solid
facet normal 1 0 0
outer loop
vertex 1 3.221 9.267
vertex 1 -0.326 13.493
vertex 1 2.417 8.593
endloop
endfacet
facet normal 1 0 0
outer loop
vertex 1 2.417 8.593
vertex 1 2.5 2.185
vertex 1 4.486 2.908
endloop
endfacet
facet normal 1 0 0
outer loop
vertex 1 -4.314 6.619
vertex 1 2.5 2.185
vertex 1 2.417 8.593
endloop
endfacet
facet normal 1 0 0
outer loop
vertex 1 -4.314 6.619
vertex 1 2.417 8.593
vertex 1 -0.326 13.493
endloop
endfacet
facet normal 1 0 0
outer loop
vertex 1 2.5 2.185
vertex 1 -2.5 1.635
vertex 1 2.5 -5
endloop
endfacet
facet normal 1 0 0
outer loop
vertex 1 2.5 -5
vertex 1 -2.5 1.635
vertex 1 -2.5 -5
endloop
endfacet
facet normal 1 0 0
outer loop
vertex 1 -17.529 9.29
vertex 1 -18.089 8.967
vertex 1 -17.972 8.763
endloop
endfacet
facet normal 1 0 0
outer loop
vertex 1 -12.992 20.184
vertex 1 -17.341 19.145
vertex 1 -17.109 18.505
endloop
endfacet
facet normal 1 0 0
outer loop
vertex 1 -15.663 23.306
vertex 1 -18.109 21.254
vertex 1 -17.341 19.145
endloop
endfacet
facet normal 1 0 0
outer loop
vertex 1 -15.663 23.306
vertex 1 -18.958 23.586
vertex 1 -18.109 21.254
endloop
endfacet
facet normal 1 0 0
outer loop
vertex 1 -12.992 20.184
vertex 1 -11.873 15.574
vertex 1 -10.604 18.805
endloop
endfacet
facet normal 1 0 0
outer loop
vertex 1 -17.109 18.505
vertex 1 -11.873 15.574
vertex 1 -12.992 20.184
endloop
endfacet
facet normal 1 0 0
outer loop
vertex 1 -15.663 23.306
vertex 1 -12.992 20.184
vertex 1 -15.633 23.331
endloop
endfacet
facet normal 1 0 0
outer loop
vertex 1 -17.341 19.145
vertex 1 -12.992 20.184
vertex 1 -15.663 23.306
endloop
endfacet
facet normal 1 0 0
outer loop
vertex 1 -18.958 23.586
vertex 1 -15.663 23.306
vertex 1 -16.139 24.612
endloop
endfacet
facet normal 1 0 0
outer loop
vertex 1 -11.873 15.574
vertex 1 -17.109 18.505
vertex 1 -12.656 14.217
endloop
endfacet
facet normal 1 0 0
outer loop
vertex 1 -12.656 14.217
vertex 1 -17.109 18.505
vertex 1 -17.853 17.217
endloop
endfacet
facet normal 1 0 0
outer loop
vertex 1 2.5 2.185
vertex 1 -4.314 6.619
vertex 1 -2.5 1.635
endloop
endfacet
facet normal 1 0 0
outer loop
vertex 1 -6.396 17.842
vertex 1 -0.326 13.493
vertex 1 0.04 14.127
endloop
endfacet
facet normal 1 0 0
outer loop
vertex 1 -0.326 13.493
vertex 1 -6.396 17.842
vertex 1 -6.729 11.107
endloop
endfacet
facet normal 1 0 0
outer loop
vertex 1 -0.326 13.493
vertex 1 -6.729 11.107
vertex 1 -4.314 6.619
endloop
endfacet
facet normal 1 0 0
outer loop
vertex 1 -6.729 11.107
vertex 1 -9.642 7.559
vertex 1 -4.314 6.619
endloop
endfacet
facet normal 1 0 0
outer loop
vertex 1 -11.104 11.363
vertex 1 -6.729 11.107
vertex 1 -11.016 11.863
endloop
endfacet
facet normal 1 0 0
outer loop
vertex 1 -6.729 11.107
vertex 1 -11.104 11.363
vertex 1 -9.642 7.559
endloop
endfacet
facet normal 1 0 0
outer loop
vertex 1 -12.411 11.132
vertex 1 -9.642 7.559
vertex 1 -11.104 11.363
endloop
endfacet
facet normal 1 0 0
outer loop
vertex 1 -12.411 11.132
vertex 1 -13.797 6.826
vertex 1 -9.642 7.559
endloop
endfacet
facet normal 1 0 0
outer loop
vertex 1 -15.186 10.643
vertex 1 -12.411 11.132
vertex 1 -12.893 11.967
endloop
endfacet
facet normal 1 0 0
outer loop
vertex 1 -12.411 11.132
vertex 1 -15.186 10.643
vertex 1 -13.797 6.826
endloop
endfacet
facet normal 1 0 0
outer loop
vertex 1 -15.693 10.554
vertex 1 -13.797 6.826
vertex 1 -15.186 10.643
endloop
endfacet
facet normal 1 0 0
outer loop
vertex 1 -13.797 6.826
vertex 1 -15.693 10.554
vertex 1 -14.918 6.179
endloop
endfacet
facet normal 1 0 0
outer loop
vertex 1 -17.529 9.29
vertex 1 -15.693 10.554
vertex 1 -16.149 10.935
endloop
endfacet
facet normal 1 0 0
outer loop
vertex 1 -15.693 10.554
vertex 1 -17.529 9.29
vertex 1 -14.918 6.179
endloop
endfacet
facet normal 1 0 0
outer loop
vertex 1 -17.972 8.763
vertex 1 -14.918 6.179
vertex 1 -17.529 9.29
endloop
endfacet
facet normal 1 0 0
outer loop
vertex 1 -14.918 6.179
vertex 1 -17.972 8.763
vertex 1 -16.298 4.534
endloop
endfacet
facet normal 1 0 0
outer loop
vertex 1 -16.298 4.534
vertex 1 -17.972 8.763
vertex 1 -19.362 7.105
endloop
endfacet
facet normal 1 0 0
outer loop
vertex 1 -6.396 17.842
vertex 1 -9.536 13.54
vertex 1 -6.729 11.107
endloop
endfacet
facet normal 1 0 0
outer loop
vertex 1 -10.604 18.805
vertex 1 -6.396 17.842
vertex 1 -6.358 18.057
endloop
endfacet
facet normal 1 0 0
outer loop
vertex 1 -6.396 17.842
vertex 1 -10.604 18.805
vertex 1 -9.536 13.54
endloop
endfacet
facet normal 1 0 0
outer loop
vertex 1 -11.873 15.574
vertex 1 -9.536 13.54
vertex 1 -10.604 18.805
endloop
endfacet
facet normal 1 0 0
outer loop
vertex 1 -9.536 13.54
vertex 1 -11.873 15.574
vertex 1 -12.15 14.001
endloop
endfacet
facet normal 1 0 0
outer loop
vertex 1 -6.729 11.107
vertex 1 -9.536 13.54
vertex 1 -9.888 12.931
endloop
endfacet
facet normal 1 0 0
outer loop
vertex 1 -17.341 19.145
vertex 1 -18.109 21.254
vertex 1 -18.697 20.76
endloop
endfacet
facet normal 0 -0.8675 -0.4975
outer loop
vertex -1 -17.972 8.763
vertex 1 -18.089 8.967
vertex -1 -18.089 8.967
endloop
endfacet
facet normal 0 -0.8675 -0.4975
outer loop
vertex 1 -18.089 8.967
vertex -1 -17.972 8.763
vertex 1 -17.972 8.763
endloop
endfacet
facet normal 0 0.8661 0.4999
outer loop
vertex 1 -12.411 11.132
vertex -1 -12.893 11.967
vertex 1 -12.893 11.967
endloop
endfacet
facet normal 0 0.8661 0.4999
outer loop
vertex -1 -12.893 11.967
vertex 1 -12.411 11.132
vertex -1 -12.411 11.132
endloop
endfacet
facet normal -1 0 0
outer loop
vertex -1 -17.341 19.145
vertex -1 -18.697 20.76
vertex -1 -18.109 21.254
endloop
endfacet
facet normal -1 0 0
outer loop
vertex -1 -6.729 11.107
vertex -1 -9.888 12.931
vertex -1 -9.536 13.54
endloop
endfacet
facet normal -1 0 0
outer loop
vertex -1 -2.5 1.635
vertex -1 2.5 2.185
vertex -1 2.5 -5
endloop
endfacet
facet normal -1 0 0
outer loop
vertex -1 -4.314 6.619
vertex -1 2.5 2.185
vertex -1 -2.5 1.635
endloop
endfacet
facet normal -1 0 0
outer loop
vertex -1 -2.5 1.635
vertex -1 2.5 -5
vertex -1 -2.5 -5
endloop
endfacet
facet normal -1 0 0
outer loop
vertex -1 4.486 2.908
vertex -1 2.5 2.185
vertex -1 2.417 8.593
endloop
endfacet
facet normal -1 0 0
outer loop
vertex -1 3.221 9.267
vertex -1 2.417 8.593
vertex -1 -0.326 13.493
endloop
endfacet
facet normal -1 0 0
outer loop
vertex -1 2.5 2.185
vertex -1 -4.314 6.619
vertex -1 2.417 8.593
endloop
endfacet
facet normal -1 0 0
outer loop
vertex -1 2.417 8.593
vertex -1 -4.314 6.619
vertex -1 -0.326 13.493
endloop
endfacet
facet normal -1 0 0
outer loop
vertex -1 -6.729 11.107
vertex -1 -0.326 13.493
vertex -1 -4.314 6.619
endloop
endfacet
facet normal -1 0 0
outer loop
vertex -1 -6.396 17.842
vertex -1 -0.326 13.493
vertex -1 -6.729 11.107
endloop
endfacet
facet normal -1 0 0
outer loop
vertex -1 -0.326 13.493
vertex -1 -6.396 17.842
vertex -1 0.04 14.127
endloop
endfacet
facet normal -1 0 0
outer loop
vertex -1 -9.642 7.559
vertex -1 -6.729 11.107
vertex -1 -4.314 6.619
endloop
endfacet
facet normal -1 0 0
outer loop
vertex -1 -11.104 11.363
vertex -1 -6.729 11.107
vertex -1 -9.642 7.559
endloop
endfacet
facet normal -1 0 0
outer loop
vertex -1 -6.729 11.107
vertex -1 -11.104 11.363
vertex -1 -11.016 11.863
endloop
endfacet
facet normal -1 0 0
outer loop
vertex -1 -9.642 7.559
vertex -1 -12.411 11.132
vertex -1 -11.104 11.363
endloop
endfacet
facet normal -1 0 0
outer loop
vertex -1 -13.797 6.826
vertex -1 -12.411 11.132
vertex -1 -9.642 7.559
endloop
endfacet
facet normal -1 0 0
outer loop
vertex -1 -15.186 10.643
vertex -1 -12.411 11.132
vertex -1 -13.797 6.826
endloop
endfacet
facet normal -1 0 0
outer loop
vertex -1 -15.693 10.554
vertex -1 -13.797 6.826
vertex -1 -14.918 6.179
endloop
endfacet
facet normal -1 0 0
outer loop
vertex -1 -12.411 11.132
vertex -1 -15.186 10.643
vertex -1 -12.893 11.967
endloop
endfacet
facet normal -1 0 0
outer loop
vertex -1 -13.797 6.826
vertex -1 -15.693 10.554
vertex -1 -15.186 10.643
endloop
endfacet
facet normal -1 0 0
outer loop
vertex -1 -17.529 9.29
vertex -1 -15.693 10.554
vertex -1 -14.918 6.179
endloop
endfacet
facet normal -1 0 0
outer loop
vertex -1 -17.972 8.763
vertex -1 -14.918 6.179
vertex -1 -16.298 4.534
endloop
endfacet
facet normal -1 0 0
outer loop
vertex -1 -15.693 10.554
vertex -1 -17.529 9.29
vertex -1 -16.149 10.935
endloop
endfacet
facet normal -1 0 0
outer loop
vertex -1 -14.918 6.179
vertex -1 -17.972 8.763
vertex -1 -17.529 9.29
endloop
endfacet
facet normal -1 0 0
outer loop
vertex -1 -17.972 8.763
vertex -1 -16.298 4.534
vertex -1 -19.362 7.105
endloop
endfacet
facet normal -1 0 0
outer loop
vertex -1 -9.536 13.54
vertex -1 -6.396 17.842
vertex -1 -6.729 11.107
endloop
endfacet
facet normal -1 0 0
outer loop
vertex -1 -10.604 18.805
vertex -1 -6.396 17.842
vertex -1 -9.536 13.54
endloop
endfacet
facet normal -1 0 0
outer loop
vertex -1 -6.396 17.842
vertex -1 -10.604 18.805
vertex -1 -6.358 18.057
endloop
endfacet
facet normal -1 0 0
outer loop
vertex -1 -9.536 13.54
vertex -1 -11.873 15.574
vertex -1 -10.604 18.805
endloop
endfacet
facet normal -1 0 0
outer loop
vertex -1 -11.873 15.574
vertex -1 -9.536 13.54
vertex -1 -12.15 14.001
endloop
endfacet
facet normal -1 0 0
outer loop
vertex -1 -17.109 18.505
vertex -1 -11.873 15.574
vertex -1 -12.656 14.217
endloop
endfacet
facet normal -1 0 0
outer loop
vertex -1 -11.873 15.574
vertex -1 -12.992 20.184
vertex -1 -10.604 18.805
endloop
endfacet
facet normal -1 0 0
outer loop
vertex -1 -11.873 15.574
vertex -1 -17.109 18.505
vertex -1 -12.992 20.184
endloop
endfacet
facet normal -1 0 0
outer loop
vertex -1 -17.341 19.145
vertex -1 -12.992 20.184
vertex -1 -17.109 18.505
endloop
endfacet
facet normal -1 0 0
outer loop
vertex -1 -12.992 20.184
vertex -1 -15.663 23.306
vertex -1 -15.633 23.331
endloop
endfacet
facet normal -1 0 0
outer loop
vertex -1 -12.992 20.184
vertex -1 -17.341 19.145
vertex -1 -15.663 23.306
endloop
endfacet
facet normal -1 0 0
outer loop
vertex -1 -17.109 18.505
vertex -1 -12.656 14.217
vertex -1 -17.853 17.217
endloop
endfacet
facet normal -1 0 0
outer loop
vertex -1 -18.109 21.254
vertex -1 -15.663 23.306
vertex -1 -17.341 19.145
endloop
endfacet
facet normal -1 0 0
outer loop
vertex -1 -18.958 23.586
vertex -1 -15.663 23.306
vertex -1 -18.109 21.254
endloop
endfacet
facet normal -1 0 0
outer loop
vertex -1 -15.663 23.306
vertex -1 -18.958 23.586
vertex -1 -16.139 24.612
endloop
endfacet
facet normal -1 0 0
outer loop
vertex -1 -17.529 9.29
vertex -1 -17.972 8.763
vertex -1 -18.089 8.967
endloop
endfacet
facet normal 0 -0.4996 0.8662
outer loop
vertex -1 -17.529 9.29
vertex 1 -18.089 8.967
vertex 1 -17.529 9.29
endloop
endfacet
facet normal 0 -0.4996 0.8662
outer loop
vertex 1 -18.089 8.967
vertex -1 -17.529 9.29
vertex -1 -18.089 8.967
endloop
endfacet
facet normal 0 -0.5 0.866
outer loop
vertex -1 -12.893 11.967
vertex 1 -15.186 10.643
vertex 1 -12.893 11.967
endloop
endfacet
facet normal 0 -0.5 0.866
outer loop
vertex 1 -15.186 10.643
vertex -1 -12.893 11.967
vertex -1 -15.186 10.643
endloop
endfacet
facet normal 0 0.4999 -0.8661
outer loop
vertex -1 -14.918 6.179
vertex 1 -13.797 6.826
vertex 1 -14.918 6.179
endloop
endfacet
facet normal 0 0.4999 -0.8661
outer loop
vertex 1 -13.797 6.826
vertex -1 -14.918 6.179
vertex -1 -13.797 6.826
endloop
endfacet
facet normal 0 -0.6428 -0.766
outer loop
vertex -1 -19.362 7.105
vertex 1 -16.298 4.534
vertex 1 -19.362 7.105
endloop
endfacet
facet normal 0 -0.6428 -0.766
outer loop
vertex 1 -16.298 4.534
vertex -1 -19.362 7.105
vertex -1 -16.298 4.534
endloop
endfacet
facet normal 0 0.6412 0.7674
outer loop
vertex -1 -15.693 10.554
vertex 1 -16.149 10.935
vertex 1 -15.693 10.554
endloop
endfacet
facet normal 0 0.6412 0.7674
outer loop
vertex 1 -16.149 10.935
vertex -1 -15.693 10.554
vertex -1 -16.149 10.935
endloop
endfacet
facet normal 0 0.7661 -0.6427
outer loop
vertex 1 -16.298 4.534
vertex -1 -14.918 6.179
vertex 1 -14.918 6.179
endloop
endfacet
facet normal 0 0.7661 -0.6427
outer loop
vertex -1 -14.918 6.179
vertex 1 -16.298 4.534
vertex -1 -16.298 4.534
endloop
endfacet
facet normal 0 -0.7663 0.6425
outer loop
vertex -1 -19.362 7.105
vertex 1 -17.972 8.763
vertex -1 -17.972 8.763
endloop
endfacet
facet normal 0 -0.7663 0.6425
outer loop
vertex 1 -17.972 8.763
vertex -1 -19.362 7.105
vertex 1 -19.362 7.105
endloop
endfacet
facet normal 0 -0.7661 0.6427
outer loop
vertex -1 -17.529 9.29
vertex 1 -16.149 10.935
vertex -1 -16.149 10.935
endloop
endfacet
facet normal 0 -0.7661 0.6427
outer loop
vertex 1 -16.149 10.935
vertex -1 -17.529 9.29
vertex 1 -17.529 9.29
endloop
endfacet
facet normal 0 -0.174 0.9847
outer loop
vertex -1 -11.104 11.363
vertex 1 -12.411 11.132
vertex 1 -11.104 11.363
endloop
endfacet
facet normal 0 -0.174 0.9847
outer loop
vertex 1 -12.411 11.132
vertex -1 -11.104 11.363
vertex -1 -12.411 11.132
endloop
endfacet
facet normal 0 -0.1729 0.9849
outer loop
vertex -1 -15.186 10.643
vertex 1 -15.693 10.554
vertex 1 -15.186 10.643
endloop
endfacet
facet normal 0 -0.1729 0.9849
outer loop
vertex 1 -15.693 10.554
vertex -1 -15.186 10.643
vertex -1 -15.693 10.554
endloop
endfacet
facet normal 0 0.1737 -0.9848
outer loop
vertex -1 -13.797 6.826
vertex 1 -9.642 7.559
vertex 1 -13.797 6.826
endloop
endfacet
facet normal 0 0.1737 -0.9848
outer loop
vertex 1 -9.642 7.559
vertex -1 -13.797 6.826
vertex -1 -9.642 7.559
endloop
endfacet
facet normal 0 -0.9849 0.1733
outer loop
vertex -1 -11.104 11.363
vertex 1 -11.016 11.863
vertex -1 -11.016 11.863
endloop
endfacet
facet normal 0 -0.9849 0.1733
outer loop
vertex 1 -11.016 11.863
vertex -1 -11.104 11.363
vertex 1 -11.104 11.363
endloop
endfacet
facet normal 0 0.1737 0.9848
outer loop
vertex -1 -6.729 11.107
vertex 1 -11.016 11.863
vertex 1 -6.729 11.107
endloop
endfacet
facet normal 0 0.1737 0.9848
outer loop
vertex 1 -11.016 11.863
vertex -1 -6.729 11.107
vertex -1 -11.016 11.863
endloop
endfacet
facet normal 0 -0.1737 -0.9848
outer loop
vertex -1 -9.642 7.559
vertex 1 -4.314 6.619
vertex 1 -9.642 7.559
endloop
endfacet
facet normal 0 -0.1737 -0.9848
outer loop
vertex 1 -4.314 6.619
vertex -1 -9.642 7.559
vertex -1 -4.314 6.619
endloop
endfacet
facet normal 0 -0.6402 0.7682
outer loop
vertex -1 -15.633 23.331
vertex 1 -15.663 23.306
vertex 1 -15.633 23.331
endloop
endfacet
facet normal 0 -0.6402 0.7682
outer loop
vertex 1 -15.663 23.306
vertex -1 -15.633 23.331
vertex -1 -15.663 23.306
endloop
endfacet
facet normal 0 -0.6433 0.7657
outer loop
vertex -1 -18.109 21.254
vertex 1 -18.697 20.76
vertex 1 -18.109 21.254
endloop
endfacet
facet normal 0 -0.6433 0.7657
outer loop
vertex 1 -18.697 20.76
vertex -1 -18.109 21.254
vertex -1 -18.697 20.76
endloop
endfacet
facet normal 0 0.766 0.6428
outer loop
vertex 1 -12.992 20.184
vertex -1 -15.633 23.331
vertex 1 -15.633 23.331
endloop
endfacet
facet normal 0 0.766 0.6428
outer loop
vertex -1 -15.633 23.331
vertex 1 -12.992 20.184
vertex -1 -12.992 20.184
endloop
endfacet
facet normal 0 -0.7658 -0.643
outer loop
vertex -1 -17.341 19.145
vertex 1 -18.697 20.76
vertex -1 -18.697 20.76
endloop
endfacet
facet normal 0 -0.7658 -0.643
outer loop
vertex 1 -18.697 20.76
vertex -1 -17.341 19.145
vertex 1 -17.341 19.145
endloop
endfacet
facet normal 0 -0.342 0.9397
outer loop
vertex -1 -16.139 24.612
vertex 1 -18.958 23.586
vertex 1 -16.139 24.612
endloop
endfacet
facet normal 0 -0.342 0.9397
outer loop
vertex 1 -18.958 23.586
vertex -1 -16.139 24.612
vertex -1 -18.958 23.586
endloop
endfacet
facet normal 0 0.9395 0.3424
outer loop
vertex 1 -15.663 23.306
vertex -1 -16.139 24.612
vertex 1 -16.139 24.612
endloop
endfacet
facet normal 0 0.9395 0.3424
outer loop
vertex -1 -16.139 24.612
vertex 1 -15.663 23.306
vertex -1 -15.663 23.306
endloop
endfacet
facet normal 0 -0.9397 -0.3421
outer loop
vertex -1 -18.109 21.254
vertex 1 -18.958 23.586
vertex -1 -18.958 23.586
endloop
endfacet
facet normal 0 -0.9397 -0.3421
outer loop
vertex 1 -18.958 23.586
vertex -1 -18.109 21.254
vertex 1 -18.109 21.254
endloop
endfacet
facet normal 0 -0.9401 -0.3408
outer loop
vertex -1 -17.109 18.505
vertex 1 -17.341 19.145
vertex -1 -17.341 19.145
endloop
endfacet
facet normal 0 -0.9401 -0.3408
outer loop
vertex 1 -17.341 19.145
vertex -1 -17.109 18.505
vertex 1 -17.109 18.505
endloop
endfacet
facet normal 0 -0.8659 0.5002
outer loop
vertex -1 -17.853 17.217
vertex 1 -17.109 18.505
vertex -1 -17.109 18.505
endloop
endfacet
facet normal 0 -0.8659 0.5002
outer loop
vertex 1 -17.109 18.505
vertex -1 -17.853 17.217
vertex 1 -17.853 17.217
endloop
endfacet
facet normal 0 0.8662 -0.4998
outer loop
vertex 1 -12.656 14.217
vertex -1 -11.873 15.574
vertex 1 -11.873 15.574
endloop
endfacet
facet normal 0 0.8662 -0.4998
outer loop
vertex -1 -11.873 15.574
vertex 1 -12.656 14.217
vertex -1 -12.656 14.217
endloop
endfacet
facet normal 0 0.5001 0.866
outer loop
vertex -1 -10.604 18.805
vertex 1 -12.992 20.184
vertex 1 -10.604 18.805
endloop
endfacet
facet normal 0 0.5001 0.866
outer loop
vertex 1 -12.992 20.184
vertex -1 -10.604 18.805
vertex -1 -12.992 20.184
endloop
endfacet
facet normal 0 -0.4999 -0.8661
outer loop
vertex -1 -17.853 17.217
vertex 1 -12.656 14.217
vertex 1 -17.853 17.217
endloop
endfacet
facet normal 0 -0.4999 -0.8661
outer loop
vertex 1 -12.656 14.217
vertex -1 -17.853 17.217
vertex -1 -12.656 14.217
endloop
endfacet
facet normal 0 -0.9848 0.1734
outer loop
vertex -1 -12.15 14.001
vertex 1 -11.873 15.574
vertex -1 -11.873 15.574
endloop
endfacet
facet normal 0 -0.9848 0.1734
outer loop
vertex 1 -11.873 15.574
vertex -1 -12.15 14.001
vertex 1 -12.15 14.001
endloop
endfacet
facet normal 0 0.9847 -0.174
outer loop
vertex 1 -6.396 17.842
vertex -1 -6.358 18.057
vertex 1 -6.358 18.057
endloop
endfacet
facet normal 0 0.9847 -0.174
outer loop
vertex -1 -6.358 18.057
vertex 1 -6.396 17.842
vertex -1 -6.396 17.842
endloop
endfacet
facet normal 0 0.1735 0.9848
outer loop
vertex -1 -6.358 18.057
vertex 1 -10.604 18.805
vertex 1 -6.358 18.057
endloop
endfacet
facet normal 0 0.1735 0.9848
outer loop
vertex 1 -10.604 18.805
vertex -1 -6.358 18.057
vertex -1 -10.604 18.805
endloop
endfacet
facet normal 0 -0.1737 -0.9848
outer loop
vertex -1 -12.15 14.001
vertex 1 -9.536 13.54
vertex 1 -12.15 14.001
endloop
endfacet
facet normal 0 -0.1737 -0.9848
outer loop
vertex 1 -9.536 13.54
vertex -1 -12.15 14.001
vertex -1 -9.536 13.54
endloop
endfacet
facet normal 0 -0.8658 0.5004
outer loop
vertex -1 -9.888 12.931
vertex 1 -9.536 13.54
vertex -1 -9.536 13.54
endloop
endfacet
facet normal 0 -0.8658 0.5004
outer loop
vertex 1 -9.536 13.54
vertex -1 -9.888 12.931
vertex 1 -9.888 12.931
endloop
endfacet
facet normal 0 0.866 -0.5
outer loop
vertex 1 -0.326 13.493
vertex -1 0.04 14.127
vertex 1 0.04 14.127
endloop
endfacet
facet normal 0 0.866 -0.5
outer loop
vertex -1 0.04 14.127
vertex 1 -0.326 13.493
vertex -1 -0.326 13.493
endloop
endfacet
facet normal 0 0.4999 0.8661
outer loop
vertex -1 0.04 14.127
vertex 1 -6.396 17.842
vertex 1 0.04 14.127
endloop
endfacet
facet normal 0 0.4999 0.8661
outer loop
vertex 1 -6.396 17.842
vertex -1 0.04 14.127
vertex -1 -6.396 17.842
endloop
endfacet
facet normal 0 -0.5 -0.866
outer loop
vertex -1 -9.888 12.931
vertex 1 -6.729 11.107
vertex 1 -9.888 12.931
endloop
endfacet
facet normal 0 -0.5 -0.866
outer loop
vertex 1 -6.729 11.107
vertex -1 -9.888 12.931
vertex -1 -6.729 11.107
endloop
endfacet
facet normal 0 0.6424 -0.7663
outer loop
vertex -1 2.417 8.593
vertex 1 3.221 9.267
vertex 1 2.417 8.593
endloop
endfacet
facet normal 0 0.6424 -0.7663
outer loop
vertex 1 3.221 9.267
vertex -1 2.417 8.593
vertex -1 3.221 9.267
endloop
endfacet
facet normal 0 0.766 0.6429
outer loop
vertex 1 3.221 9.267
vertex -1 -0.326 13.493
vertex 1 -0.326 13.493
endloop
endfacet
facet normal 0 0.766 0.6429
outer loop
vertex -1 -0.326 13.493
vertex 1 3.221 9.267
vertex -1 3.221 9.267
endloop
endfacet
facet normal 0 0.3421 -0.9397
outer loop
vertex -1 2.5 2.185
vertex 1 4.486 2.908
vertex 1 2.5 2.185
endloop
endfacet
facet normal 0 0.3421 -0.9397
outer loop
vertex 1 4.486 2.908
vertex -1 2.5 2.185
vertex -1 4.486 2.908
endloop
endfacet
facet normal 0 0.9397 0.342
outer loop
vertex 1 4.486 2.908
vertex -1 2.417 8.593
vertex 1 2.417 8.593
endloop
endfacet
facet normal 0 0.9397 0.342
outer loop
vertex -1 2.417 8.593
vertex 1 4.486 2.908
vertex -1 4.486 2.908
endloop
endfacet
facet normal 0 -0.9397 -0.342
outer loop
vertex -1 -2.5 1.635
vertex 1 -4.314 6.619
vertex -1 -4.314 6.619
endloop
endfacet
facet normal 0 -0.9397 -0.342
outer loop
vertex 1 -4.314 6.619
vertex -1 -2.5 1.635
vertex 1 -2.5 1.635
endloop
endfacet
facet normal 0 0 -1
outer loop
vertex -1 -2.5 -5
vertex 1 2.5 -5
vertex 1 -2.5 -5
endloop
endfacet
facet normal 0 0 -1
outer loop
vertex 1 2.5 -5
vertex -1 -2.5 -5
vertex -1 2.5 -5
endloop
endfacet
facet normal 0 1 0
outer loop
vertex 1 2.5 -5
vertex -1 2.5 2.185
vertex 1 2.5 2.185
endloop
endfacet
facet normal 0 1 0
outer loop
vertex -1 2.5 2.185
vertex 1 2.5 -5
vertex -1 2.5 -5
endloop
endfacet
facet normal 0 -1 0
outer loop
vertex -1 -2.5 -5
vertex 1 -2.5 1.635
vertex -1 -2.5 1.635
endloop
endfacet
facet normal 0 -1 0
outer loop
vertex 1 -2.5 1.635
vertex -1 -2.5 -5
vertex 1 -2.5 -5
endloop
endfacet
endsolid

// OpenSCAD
union(){cube([2,5,10],center=true) ;
translate([0,0,5])rotate([20,0,0]){
cube([2,7,7],center=true) ;
    translate([0,0,5])rotate([20,0,0]){
        cube([2,7,7],center=true) ;
            translate([0,0,5])rotate([20,0,0]){
            
            cube([2,6,8],center=true) ;
                translate([0,-5])rotate([20,0,0]){
                cube([2,4,8],center=true) ;
                    translate([0,-1,5])rotate([ 20,0,0]){
                    cube([2,4,6],center=true) ;
                        translate([0,0,2])rotate([ 20,0,0]){
                        cube([2,4,6],center=true) ;
                        translate([0,0,2])rotate([ 20,0,0])cube([2,4,5],center=true) ;}
    
    }}
            cube([2,4,7],center=true) ;
                translate([0,0,5])rotate([20,0,0]){
                cube([2,5,5],center=true) ;
                    translate([0,1,5])rotate([-20,0,0]){
                    cube([2,5,6],center=true) ;
                        translate([0,1,2])rotate([-20,0,0]){
                        cube([2,4,6],center=true) ;
                        translate([0,0,2])rotate([-20,0,0])cube([2,3,6],center=true) ;}
    
    }}}}
}
}
